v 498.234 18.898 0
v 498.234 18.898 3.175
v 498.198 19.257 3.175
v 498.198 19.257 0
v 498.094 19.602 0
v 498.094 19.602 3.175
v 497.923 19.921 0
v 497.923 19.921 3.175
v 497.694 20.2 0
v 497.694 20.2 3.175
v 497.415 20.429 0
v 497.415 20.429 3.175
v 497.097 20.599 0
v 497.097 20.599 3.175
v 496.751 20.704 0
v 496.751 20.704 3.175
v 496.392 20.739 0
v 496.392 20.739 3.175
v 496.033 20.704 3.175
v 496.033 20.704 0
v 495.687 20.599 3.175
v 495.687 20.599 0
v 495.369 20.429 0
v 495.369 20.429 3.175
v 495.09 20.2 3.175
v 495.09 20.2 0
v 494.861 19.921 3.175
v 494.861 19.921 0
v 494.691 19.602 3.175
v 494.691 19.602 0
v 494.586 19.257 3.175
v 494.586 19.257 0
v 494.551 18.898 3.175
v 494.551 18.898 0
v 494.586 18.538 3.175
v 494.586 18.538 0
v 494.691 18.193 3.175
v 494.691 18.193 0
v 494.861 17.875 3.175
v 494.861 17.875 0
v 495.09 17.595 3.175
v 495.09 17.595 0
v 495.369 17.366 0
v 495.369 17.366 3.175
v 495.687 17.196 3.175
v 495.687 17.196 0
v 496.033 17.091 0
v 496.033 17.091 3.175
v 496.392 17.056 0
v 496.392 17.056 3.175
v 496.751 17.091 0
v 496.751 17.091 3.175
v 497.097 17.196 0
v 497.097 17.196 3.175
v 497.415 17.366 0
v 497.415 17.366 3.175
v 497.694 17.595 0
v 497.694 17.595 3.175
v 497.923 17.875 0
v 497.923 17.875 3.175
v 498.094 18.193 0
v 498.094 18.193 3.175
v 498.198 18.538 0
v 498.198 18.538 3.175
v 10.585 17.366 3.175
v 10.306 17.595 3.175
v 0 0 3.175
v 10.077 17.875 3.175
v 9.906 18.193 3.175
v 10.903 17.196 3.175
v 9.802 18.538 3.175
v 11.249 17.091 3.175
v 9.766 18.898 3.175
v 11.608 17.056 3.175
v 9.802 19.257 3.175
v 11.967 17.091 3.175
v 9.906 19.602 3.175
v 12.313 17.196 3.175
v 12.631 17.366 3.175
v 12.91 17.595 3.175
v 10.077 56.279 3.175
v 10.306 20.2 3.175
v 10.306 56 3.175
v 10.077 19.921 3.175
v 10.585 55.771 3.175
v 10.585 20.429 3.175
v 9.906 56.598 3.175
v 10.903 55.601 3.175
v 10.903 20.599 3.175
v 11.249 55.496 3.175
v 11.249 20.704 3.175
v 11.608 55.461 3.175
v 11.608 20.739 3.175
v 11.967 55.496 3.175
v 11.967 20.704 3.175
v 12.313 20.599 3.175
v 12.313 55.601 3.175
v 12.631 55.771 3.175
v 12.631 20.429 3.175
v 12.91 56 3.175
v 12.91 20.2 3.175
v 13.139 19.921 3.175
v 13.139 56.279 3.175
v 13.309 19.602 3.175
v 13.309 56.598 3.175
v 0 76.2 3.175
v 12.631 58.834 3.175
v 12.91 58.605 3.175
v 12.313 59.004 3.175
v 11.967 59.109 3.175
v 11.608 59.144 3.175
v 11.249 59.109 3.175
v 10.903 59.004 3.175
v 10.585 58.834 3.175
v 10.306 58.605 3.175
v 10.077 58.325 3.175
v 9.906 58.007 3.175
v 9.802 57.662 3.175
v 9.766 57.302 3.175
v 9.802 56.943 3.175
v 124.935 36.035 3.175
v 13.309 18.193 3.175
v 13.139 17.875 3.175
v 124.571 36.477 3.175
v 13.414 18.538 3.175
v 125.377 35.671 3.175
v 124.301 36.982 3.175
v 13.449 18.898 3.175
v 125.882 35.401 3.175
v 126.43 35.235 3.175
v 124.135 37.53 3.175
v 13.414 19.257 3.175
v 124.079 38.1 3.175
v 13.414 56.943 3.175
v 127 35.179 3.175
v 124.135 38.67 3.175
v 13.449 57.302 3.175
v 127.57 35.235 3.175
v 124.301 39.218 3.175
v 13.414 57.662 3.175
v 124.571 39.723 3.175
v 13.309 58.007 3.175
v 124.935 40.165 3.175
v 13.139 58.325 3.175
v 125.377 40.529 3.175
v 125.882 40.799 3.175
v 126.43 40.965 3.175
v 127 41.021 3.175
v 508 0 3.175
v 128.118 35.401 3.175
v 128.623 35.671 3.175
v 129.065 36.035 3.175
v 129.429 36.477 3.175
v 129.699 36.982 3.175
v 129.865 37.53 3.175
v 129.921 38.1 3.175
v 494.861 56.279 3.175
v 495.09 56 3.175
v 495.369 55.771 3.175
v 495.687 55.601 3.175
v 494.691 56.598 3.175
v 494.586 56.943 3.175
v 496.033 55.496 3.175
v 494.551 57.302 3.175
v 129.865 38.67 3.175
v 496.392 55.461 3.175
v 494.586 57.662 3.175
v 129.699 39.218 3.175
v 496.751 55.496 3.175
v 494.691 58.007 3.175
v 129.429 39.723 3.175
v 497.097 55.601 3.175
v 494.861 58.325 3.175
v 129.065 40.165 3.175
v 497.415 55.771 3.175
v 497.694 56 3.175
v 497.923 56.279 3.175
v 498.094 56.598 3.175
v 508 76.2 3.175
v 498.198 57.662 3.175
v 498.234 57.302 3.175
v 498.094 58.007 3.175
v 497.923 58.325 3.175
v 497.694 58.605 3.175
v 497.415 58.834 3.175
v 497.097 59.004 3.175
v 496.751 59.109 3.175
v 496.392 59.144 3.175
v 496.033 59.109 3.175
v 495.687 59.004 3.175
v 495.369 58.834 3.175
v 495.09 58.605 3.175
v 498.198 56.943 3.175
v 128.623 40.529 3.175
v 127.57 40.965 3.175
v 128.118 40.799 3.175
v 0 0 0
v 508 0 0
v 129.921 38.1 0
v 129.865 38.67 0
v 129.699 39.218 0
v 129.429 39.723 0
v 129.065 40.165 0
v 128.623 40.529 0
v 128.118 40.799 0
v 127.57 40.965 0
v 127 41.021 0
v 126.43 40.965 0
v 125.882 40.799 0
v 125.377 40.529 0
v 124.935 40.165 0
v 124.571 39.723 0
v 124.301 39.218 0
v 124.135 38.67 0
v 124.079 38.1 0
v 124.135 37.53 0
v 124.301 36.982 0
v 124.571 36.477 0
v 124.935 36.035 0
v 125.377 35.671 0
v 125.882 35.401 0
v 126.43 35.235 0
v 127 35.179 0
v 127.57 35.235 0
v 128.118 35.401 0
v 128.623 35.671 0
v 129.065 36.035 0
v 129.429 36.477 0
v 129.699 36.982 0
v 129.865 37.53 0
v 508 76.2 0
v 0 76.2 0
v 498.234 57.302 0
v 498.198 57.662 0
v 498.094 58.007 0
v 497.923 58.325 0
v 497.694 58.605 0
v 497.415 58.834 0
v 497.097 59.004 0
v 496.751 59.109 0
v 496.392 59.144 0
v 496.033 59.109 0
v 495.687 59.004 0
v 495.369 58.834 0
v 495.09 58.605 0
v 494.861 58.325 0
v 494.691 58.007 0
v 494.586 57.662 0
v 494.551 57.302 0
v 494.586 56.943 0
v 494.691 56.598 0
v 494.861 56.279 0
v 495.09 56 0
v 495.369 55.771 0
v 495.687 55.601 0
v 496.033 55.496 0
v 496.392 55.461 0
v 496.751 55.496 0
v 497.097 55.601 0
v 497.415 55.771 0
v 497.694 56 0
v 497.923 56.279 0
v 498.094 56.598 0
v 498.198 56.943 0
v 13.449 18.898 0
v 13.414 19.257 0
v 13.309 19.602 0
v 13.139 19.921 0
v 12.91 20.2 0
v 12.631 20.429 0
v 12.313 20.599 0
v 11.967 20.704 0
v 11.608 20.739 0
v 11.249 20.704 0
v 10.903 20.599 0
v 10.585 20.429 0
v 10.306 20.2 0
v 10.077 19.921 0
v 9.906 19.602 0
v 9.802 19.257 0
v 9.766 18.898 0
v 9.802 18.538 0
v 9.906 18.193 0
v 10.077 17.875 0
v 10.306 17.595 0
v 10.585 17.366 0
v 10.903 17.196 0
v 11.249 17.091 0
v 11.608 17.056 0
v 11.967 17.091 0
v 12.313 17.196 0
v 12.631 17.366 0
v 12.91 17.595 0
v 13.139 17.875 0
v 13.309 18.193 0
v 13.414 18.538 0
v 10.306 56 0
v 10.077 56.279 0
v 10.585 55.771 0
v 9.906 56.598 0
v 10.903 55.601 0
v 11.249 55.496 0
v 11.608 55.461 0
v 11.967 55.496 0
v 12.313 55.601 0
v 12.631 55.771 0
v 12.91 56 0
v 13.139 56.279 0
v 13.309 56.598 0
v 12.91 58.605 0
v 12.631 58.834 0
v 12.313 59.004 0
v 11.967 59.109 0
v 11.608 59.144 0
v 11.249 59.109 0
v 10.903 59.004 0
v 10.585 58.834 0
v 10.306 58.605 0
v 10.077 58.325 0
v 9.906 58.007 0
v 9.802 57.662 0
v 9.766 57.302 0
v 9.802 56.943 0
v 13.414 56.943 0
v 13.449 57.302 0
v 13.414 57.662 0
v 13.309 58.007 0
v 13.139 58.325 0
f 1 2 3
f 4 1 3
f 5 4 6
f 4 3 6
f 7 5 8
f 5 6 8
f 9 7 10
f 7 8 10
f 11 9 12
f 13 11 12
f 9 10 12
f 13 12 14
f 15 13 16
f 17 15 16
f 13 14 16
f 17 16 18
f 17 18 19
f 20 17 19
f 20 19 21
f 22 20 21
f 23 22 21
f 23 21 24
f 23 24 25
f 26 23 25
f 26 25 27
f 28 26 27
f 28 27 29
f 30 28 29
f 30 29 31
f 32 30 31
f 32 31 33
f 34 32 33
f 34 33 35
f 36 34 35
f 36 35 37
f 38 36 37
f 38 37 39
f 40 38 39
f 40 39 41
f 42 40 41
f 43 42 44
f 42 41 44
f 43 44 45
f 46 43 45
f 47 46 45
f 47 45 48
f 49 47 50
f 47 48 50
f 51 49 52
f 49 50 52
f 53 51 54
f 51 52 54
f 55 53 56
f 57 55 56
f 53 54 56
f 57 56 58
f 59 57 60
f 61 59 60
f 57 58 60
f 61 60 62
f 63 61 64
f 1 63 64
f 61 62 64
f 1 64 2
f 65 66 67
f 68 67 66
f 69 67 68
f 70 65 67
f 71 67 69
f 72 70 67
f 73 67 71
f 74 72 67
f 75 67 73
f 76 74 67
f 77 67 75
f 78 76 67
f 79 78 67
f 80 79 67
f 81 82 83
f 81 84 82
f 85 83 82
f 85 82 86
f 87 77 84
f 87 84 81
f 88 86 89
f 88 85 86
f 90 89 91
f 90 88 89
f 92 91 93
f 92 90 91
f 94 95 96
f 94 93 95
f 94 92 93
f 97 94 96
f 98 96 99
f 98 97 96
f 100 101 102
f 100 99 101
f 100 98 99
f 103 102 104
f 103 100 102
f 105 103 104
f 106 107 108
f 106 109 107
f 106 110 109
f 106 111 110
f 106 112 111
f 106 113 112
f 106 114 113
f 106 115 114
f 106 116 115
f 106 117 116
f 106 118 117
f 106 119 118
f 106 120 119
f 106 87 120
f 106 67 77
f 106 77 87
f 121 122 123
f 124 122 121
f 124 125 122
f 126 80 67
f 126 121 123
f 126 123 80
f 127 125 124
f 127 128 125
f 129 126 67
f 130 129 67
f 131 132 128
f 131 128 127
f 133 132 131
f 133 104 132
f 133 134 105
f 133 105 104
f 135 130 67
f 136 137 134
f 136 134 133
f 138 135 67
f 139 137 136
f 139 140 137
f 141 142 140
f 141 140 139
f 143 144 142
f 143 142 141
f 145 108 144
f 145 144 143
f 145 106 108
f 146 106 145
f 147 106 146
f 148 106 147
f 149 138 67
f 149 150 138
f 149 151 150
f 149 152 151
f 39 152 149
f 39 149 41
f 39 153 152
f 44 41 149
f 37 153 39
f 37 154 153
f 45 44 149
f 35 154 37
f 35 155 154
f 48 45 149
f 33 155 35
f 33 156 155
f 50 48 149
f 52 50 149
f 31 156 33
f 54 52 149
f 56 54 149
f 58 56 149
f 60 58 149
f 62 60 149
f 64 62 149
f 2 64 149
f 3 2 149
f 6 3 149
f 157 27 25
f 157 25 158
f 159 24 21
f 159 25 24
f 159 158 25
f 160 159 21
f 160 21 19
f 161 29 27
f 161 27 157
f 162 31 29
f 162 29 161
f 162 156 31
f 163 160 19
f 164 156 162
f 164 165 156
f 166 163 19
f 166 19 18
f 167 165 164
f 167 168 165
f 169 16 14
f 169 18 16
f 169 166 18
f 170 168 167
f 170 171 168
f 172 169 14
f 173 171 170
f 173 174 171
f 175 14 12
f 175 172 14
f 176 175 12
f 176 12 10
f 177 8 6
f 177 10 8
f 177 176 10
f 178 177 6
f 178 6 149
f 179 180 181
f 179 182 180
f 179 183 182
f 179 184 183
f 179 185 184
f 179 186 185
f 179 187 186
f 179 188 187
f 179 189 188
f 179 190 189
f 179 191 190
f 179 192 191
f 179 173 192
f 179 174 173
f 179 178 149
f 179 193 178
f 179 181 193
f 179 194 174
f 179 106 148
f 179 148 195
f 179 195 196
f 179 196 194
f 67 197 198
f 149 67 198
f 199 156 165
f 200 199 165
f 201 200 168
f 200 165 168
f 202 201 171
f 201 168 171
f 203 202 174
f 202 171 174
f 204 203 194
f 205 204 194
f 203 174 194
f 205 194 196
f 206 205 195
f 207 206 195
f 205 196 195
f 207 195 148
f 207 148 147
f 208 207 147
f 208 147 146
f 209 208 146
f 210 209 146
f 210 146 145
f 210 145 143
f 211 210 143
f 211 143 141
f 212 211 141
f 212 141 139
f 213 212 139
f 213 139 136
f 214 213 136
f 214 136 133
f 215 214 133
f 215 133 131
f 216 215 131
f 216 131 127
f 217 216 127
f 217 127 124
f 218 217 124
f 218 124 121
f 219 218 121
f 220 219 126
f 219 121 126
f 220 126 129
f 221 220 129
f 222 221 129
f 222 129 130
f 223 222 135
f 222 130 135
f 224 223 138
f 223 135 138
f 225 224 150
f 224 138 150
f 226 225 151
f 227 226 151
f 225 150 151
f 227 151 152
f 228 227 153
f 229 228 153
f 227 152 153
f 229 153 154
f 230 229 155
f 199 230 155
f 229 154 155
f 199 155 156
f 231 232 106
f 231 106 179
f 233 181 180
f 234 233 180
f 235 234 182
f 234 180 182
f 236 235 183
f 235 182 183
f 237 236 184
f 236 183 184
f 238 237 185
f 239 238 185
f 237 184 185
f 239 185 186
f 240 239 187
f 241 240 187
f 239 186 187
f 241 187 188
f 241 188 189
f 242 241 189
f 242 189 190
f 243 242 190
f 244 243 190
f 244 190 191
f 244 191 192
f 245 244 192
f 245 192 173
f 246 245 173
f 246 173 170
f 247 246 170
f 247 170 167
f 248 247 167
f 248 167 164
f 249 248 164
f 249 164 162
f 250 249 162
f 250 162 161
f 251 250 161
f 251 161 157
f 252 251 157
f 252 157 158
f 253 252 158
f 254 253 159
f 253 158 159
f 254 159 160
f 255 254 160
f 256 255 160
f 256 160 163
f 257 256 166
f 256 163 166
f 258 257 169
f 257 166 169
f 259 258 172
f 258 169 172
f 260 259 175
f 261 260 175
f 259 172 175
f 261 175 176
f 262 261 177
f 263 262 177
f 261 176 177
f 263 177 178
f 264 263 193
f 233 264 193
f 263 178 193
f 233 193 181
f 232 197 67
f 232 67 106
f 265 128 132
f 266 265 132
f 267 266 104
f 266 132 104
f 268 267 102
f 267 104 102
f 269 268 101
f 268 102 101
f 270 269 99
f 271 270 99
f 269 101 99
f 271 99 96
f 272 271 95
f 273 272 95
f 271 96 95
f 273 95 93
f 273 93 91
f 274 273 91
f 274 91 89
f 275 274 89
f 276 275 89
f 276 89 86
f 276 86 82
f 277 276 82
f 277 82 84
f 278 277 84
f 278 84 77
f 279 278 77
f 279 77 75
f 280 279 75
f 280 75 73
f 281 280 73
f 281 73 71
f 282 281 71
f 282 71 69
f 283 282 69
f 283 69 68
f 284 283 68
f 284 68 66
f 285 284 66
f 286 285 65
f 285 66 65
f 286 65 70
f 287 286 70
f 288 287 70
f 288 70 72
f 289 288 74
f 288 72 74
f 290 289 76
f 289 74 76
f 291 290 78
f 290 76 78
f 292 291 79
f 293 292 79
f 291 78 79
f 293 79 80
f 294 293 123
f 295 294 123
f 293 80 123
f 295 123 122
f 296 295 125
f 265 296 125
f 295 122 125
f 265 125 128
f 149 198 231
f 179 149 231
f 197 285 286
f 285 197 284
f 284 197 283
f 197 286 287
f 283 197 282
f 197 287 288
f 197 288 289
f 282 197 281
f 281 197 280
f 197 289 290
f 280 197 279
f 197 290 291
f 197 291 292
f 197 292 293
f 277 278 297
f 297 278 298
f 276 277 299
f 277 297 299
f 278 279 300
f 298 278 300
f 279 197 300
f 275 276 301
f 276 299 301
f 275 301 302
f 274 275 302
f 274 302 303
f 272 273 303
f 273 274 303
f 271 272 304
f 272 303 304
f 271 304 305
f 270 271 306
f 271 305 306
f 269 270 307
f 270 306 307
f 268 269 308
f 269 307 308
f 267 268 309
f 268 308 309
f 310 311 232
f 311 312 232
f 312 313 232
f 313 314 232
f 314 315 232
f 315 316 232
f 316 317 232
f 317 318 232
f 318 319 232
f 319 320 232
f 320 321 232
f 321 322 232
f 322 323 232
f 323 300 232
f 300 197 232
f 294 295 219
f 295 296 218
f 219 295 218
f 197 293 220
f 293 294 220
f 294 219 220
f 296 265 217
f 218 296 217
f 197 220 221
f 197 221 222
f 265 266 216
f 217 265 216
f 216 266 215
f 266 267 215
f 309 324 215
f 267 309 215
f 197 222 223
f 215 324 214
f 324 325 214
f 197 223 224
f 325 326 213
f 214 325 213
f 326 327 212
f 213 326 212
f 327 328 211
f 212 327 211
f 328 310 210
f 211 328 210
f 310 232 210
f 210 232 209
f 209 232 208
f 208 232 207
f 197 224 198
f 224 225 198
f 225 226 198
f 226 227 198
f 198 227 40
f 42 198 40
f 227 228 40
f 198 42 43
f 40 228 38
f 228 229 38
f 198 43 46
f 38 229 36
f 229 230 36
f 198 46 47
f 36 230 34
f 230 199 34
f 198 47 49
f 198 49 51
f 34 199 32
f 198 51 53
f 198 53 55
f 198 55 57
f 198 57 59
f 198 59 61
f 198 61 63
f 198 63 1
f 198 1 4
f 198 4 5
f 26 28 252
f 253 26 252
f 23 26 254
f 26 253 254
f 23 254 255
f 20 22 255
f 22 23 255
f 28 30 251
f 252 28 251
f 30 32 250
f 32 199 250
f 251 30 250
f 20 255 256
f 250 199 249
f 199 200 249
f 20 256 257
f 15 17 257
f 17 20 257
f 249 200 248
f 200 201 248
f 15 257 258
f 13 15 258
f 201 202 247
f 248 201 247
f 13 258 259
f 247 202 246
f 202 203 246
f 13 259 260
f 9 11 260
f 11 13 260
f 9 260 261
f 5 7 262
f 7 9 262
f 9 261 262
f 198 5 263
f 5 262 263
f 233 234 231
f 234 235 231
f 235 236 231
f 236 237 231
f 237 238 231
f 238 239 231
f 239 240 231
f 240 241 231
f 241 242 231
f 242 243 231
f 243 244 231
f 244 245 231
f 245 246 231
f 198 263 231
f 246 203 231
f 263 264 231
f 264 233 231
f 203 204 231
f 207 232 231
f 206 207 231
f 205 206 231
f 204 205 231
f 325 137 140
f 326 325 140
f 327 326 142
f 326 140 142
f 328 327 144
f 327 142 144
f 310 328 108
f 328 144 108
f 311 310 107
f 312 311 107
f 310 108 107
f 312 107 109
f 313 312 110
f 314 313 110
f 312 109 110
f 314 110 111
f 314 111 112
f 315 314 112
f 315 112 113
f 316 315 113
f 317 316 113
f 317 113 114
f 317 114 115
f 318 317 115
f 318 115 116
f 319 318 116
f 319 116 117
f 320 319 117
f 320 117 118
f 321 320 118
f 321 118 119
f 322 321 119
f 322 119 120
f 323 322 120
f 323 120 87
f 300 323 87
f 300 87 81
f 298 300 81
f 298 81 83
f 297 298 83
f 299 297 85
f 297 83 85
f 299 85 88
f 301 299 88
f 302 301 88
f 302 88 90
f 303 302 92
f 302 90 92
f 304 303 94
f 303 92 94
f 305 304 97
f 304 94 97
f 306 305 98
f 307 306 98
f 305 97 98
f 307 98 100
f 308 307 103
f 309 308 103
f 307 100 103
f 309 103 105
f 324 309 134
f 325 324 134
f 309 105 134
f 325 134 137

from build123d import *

# Parameters (mm, degrees)
SKETCH1_W            = 508
SKETCH1_H            = 76.2
BASIC_PLANK_DEPTH    = 3.175
SKETCH4_R            = 2.921
THROUGH_TRIPOD_DEPTH = 4.175
SKETCH5_R            = 1.8415
BRACKET_HOLES_DEPTH  = 4.175


with BuildPart() as part:
    # Sketch1 → basic_plank (new body)
    with BuildSketch(Plane.XY):
        with Locations((254, 38.1)):
            Rectangle(SKETCH1_W, SKETCH1_H)
    extrude(amount=BASIC_PLANK_DEPTH)

    # Sketch4 → through_tripod (cut, through all)
    with BuildSketch(Plane.XY.offset(3.175)):
        with Locations((127, 38.1)):
            Circle(SKETCH4_R)
    extrude(amount=-THROUGH_TRIPOD_DEPTH, mode=Mode.SUBTRACT)

    # Sketch5 → bracket holes (cut, through all)
    with BuildSketch(Plane.XY.offset(3.175)):
        with Locations((11.6078, 57.3024)):
            Circle(SKETCH5_R)
        with Locations((11.6078, 18.8976)):
            Circle(SKETCH5_R)
        with Locations((496.3922, 18.8976)):
            Circle(SKETCH5_R)
        with Locations((496.3922, 57.3024)):
            Circle(SKETCH5_R)
    extrude(amount=-BRACKET_HOLES_DEPTH, mode=Mode.SUBTRACT)


solid = part.part
